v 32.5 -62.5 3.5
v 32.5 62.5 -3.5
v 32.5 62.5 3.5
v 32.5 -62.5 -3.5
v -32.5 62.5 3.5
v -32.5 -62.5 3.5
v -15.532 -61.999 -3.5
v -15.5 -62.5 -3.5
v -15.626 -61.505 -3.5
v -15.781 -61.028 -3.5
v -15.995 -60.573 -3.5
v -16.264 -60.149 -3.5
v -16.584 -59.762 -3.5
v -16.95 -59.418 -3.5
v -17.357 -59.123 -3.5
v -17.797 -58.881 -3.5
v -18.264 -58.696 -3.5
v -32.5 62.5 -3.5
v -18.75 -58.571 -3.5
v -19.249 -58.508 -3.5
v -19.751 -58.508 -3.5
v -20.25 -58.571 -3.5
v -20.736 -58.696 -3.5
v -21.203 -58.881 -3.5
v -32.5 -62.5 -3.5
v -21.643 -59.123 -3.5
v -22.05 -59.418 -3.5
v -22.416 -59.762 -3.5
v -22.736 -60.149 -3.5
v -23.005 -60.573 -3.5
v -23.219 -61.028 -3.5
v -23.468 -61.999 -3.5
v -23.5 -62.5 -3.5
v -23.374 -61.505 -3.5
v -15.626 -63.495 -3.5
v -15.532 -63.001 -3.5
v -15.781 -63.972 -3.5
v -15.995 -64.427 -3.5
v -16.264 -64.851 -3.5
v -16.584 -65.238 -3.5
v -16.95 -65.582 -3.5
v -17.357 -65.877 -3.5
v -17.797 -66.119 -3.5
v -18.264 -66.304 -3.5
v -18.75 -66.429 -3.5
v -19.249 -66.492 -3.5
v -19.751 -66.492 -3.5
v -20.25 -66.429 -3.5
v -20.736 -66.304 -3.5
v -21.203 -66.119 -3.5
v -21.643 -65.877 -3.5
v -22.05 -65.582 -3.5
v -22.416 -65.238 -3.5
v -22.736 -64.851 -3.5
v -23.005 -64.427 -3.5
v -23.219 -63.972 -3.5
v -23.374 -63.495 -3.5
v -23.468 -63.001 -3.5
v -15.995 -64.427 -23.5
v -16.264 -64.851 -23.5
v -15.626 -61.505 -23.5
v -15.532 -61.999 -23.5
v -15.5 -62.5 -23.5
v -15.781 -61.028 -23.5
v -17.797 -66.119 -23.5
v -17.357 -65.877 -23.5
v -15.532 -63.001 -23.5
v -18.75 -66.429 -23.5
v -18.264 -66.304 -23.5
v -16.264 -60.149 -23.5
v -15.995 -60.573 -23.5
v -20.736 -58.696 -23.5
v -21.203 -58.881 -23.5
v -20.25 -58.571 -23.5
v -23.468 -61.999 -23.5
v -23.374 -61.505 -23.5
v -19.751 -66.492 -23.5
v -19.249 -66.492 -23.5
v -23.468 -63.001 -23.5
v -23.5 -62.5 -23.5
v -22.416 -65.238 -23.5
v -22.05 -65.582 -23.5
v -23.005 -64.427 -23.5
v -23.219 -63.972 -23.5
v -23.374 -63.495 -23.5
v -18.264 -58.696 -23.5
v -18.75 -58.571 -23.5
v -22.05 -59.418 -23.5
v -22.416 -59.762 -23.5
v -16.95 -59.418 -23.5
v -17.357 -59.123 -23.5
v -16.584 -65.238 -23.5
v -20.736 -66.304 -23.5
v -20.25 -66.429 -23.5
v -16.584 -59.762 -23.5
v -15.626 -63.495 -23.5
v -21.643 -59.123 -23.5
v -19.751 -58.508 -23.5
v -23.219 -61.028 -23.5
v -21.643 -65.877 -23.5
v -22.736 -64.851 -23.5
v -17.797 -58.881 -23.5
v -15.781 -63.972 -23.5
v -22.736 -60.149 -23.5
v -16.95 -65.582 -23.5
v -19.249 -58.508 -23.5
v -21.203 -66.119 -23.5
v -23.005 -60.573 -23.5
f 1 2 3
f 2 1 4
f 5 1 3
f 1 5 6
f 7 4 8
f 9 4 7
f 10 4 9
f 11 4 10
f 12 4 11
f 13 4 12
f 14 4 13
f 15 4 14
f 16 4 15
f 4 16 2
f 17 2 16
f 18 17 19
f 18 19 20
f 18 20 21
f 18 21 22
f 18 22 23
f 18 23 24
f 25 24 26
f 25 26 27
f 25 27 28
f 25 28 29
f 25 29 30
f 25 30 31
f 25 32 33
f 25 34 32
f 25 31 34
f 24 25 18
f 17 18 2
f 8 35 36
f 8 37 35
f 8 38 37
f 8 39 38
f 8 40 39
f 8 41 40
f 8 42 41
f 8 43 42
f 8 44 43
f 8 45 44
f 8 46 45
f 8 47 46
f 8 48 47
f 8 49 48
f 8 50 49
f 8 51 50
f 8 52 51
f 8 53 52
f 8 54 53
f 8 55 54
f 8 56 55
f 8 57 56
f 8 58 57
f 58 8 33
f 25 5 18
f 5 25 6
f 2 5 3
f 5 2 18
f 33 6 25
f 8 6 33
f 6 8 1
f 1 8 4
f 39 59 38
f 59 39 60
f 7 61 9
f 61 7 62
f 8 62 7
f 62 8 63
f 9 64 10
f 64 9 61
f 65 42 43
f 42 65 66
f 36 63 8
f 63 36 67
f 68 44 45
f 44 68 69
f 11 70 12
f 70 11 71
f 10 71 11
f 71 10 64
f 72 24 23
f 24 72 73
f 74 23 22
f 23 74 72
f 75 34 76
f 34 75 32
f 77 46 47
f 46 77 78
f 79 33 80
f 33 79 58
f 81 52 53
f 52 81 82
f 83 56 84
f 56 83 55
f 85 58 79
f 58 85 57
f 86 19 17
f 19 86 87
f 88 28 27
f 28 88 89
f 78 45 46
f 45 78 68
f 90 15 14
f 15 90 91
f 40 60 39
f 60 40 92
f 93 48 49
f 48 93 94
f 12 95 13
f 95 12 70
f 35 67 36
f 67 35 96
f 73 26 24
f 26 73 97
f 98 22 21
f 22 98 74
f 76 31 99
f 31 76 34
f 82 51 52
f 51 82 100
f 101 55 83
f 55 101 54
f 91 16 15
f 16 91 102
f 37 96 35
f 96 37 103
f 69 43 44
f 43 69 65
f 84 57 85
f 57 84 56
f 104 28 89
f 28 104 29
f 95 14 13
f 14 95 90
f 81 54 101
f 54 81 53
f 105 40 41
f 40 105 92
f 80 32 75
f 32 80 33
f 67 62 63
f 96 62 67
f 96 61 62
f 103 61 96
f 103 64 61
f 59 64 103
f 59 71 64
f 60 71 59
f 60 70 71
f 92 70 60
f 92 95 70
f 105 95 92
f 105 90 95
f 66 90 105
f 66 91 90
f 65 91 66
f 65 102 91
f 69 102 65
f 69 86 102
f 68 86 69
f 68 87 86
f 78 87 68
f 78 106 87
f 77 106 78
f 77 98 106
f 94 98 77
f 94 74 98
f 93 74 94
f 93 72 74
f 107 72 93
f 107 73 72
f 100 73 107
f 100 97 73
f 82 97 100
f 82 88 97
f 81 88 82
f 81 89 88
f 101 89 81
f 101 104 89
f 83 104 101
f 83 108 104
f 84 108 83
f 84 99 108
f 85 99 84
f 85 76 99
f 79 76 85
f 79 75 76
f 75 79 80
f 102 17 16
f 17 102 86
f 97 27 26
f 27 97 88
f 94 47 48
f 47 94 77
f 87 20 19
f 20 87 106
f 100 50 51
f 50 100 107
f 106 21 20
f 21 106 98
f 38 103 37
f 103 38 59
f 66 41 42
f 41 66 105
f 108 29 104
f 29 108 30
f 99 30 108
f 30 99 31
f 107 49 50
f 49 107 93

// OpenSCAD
// file: ../robot_settings.scad
main_box_x = 95.5; // 96
main_box_y = 102;
main_box_z = 74; // 74.5
wall_thickness = 2;

rail_gap = 2;
rail_inset = 7;

rail_thickness = 7;
rail_length = 250;
rail_width = 200;

raspberry_pi_screw_seperation_y = 57;
raspberry_pi_screw_seperation_z = 48;
raspberry_pi_peg_h = 8;

gears_module = 1;
pinion_gear_teeth = 30;
pinion_gear_width = 5;
pinion_gear_bore = 4;

gears_setback_distance = 25;
gear_post_height = 2 * pinion_gear_width + rail_thickness + 8 ;

steering_motor_mount_x = 45;
steering_motor_mount_y = 36;
steering_motor_mount_z = 18;
steering_motor_mount_setback_distance = gears_setback_distance + 16;

dc_motor_housing_minus_encoder_z = 48;
dc_motor_encoder_z = 9.33;
dc_motor_encoder_wheel_d = 13.4;
dc_motor_encoder_wheel_thickness = 5;
dc_motor_encoder_wheel_gap = 3;
dc_motor_encoder_circuit_thickness = 2;
dc_motor_cutout_d = 24.8;
dc_motor_cutout_z = 19.5;

dc_motor_screw_head_z = 2;
dc_motor_screw_head_d = 5.6;
dc_motor_screw_d = 3.2;
dc_motor_screw_offset = 8.5;

dc_motor_axle_ring_z = 3;
dc_motor_axle_ring_d = 7.2;
dc_motor_axle_cutout_d = 4.5;
dc_motor_axle_cutout_z = 10;
dc_motor_axle_notch_cutout = 0.5;
dc_motor_axle_notch_cutout_z = 6;

steering_shaft_z = gear_post_height + dc_motor_axle_ring_z + pinion_gear_width + 15;
steering_shaft_d = 7;
steering_shaft_motor_fitting_d = 9;

lidar_mount_y = 125;
lidar_mount_x = 65;

ball_bearing_height = 7;
ball_bearing_outer_diameter = 22;
ball_bearing_inner_diameter = 8;

pull_bar_radius = 3.3;

rack_module = 1;
rack_length = main_box_x / 2;
rack_height = 10;
rack_width = 10;
rack_teeth = 30;
rack_bore = 3;

// tire hardware
axle_reciever_inner_diameter = 7.75;
axle_reciever_length = 18.8;
axle_notch_length = 7;
axle_notch_cutout = 2.4;
// main file
  include <../robot_settings.scad>      
  $fn = 50;
  
  module lidar_mount()
  {
    peg_height = 20;

    cube([lidar_mount_x, lidar_mount_y, rail_thickness], center = true);
    
    // peg 1
    translate([
      -lidar_mount_x / 2 + lidar_mount_x / 5, 
      -lidar_mount_y / 2, 
      -peg_height -rail_thickness / 2
    ])
    
    cylinder(
      h = peg_height, 
      d = ball_bearing_inner_diameter
    );
    
    // peg 2
    translate([
      -lidar_mount_x / 2 + lidar_mount_x / 5, 
      -lidar_mount_y / 2, 
      -peg_height -rail_thickness / 2
    ])
    
    cylinder(
      h = peg_height, 
      d = ball_bearing_inner_diameter
    );
  }
  
  lidar_mount();
